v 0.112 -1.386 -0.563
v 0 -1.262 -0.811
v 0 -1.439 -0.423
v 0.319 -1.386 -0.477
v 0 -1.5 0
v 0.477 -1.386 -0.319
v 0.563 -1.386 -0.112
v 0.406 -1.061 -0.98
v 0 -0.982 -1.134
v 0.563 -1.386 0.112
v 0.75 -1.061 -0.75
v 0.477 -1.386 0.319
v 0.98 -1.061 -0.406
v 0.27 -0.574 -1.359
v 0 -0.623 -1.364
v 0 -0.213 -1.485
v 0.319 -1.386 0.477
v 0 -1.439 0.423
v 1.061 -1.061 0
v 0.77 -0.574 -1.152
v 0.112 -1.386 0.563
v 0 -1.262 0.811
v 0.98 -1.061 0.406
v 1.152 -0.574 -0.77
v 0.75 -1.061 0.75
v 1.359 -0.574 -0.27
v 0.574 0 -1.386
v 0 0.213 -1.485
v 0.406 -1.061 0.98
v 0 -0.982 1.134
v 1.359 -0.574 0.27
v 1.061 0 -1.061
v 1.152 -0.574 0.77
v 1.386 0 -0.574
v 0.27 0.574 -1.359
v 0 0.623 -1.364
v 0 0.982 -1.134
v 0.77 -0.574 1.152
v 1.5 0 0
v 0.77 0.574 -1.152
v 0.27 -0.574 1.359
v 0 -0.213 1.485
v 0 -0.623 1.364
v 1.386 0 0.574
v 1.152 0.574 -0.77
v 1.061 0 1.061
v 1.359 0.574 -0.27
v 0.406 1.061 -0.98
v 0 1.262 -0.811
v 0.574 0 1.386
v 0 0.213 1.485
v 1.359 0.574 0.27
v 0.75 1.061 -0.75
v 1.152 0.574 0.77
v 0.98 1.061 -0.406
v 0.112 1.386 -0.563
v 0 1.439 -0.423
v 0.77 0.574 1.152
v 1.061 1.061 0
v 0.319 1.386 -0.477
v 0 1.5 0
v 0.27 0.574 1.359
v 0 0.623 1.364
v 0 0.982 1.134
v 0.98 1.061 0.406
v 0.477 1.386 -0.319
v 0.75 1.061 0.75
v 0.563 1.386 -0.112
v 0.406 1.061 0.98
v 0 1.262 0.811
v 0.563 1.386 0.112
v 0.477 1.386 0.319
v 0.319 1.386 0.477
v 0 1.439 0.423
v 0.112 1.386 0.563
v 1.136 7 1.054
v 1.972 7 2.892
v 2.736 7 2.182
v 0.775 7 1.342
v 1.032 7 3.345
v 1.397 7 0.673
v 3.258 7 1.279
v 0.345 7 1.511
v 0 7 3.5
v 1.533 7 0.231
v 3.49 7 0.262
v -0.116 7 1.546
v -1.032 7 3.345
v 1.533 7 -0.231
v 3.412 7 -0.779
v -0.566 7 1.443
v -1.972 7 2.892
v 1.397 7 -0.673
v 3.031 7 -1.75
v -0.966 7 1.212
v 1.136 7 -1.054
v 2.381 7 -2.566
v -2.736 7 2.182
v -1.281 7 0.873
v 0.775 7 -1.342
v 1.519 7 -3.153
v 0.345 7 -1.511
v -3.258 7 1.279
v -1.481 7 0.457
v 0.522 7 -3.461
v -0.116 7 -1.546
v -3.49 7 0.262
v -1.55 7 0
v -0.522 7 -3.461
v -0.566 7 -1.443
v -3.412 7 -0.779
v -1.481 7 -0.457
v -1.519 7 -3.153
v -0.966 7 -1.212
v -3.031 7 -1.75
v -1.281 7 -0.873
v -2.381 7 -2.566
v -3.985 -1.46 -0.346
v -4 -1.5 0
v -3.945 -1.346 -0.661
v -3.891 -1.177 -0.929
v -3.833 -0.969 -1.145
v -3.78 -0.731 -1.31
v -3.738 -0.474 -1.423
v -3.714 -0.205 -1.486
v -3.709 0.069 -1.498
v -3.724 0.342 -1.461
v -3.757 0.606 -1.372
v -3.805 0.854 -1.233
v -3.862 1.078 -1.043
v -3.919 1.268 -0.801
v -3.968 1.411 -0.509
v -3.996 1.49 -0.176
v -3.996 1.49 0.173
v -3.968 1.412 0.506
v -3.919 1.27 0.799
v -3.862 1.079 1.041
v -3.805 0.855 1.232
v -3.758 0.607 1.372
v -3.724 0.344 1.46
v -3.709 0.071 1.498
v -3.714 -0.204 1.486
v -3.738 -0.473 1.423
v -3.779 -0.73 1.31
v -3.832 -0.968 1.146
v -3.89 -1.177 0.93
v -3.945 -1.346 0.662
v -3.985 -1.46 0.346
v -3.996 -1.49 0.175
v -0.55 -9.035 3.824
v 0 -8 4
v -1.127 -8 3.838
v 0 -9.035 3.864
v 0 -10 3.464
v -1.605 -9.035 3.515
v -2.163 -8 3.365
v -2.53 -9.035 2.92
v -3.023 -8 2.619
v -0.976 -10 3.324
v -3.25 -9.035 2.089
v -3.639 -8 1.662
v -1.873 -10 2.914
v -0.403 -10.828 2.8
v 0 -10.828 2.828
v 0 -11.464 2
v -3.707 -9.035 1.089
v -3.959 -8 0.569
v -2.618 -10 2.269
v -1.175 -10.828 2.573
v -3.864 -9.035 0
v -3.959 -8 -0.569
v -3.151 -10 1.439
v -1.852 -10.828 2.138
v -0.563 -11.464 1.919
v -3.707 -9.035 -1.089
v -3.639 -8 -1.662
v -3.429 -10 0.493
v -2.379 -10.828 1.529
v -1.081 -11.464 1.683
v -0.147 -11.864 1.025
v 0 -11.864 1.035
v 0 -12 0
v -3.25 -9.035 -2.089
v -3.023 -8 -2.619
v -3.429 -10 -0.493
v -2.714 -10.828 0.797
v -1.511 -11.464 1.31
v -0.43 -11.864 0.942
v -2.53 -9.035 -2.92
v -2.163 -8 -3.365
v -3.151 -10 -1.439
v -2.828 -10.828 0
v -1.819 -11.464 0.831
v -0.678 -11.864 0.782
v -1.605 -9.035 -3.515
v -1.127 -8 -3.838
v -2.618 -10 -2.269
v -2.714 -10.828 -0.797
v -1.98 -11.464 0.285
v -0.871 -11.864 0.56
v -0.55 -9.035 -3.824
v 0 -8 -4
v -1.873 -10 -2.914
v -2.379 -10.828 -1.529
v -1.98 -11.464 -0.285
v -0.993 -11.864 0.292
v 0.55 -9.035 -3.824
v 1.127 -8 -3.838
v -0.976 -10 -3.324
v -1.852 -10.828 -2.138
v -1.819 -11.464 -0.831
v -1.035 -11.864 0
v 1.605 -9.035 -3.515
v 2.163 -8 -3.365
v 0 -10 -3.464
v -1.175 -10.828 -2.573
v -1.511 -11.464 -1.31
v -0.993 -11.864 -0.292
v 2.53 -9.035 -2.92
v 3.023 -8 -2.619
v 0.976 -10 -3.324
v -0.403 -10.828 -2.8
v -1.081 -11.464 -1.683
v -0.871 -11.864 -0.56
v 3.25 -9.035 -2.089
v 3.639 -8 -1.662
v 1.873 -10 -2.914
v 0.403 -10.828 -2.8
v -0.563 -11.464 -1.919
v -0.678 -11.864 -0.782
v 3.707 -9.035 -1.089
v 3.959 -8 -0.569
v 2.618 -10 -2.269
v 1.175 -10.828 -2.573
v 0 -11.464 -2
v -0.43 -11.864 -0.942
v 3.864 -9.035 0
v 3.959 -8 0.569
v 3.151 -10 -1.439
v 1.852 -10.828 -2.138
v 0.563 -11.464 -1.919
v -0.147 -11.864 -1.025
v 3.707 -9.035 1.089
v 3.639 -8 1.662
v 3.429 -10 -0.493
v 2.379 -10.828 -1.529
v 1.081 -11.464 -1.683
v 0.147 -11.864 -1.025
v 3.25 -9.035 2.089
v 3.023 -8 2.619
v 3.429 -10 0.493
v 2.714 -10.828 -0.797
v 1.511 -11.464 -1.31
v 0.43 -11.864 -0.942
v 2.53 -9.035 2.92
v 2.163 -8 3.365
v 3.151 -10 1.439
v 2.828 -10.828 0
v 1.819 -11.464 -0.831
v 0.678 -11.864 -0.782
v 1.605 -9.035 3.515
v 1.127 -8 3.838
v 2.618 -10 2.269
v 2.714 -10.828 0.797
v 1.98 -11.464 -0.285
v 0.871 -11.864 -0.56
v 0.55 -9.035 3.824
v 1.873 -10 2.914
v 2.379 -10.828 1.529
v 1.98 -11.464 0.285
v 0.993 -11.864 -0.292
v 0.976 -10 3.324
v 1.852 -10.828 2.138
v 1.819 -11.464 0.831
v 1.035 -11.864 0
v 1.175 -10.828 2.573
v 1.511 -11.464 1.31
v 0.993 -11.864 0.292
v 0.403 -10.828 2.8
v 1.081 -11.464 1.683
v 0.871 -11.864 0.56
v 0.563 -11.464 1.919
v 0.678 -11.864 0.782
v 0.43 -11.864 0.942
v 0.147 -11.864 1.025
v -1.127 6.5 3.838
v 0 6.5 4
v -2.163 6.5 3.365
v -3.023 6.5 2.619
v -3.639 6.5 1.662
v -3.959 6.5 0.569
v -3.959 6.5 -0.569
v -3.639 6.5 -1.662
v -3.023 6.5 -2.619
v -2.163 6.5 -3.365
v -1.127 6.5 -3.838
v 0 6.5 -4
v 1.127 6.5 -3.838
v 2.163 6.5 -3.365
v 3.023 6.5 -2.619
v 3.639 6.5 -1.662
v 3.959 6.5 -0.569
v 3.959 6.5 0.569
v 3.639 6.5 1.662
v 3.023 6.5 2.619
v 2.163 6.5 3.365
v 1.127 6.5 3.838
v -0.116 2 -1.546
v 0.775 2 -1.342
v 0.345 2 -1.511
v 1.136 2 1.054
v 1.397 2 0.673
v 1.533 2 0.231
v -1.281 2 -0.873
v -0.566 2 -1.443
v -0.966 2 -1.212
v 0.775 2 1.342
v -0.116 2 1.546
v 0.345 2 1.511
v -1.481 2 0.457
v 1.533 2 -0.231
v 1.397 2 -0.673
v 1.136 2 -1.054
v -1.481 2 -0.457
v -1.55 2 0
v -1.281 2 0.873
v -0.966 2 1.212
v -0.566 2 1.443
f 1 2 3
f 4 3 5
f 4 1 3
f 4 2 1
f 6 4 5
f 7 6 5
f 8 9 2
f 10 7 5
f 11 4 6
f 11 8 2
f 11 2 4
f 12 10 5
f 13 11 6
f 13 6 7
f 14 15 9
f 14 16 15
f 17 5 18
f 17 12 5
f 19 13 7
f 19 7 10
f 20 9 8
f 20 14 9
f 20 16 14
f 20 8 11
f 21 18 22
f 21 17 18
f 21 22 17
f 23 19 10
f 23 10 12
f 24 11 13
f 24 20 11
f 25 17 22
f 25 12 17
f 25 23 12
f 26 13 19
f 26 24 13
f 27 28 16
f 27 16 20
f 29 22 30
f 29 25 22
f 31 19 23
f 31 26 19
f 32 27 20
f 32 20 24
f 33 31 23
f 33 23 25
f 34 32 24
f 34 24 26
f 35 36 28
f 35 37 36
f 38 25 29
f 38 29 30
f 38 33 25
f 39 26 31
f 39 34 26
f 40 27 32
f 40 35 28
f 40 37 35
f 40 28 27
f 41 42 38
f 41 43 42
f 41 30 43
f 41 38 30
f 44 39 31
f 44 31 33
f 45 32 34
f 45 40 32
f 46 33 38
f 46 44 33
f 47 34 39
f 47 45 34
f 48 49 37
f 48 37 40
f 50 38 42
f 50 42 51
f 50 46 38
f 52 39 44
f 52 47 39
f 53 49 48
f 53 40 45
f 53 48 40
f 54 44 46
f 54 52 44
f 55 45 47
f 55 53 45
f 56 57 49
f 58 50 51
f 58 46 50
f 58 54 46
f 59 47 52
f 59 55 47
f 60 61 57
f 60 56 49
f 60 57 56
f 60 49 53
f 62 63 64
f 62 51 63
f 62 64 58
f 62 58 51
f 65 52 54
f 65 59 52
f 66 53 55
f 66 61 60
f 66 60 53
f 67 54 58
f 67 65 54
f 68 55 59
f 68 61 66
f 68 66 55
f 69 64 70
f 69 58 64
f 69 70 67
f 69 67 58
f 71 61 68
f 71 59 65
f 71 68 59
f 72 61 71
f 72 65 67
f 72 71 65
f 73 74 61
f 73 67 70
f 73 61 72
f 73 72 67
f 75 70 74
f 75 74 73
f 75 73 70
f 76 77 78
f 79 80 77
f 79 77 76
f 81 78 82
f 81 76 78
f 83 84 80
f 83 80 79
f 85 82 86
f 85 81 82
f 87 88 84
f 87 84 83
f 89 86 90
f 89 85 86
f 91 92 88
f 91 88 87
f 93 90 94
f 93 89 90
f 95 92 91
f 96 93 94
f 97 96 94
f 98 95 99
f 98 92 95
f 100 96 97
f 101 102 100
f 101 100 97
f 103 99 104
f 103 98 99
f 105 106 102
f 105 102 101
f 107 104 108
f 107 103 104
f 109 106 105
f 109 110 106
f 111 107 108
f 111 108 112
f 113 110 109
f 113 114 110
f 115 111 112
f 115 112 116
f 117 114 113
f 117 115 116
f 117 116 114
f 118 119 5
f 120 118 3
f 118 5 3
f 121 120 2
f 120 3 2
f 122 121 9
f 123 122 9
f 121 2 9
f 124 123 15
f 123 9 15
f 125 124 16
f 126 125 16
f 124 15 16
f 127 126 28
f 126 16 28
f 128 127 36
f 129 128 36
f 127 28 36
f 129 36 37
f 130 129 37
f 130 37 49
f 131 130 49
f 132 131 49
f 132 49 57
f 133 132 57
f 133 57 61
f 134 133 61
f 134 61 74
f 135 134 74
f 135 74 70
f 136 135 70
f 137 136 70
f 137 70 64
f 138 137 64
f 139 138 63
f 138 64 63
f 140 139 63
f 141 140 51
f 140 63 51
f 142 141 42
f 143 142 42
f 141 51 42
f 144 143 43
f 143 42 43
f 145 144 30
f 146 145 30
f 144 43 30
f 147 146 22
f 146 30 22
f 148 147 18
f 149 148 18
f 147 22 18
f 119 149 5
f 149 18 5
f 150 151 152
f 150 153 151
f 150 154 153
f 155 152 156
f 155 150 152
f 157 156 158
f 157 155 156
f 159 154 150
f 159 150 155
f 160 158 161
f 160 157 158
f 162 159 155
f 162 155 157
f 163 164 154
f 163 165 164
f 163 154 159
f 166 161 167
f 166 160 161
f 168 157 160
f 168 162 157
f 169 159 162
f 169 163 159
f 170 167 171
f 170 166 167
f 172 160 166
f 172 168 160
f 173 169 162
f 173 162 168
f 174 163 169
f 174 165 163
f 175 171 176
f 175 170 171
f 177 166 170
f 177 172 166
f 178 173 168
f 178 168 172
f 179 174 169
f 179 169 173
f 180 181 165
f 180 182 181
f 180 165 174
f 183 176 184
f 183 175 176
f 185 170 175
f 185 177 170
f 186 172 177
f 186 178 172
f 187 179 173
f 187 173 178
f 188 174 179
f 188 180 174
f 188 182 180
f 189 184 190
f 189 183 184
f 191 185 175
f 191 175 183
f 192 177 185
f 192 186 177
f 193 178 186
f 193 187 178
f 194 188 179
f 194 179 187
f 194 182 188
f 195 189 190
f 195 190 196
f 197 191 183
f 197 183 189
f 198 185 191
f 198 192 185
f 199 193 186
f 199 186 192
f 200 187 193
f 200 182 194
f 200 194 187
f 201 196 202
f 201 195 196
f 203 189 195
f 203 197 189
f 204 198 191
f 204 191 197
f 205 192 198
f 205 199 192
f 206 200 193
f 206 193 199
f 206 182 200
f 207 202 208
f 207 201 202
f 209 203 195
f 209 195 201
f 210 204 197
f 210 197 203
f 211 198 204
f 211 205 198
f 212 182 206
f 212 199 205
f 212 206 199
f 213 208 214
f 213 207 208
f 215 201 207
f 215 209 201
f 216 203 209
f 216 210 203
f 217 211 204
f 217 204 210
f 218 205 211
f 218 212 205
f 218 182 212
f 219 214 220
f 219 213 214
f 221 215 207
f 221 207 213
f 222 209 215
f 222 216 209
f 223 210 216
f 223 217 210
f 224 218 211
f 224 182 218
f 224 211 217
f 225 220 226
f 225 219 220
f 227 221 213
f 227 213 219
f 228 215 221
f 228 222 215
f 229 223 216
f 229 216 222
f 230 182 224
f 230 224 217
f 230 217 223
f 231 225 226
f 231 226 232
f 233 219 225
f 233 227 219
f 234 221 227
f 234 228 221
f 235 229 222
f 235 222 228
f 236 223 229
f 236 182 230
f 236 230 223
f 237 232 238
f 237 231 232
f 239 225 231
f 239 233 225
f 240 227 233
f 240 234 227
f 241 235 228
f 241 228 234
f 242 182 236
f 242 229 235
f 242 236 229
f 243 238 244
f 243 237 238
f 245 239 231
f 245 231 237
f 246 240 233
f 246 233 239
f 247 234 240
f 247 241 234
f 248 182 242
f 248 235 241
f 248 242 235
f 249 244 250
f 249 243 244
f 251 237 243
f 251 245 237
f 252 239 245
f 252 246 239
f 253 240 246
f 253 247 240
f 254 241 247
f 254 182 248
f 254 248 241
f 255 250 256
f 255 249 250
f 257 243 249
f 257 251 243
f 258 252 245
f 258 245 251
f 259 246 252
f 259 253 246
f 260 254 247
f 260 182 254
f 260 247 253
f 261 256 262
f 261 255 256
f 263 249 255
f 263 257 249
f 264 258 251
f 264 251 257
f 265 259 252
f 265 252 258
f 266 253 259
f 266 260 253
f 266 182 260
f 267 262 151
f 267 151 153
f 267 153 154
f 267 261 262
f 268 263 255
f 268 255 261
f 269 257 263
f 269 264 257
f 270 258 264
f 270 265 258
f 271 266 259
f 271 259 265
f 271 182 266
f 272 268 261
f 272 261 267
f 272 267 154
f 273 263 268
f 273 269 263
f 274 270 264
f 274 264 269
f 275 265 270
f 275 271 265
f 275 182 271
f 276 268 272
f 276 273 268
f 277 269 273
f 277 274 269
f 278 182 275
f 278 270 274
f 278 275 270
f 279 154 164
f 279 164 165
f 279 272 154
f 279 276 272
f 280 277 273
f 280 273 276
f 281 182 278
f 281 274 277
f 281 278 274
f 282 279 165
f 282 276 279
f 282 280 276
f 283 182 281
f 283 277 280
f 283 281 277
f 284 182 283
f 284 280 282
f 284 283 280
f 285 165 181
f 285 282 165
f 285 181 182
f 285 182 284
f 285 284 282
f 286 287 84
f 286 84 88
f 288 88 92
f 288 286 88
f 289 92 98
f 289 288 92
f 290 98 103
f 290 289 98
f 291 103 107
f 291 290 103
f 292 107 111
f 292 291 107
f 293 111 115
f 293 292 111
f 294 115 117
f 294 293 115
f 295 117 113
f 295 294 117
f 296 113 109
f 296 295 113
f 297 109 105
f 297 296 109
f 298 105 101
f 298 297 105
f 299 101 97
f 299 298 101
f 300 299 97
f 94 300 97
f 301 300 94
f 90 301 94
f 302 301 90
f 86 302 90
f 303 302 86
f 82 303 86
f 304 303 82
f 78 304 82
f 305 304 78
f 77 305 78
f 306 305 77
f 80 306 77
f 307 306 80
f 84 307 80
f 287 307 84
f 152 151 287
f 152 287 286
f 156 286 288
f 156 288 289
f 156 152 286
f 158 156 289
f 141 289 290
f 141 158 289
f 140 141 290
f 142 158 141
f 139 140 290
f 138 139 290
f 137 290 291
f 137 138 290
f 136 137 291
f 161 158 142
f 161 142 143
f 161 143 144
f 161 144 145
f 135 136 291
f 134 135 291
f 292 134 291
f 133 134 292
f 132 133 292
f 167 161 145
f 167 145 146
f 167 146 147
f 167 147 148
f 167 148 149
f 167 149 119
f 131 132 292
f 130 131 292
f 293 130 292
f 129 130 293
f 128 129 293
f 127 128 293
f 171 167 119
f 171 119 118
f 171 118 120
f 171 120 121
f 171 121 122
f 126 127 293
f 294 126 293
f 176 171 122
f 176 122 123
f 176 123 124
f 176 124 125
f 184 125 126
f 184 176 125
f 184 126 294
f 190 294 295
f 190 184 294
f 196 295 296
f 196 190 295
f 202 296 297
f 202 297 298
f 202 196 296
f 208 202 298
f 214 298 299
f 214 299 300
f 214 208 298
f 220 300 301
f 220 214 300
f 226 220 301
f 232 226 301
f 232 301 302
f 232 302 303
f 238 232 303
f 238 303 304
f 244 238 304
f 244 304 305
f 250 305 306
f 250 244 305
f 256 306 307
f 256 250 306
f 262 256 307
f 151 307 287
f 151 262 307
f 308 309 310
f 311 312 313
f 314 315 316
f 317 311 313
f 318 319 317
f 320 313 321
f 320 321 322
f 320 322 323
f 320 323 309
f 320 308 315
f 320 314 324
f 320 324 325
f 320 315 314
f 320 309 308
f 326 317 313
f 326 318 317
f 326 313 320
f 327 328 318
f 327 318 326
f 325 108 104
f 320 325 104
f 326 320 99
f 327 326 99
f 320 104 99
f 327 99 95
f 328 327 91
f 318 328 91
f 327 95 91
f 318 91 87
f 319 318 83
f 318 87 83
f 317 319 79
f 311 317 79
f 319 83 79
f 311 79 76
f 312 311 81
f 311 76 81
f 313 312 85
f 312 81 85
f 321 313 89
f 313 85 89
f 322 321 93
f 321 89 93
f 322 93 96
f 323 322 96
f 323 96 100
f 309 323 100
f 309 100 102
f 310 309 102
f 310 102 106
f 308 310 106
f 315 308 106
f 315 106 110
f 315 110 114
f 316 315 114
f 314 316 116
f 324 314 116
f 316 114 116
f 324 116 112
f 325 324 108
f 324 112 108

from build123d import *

# Parameters (mm, degrees)
F2_DEPTH = 25
F3_SIZE  = 0.5
F4_R     = 1.55
F5_DEPTH = 5


with BuildPart() as f1:
    # F0 (on Right) → F1 (revolve)
    with BuildSketch(Plane.YZ):
        with BuildLine():
            Line((1.5, 0), (7, 0))
            Line((7, 0), (7, 4))
            Line((7, 4), (-8, 4))
            ThreePointArc((-8, 4), (-10.8284271247, 2.8284271247), (-12, 0))
            Line((-12, 0), (-1.5, 0))
            ThreePointArc((-1.5, 0), (0, 1.5), (1.5, 0))
        make_face()
        with BuildLine():
            ThreePointArc((-1.5, 0), (0, -1.5), (1.5, 0))
            Line((1.5, 0), (-1.5, 0))
        make_face()
        with BuildLine():
            Line((-1.5, 0), (1.5, 0))
            ThreePointArc((1.5, 0), (0, 1.5), (-1.5, 0))
        make_face()
    revolve(axis=Axis((0, -2.5, 0), (0, -1, 0)))

    # F0 (on Right) → F2 (cut)
    with BuildSketch(Plane.YZ):
        with BuildLine():
            Line((-1.5, 0), (1.5, 0))
            ThreePointArc((1.5, 0), (0, 1.5), (-1.5, 0))
        make_face()
        with BuildLine():
            ThreePointArc((-1.5, 0), (0, -1.5), (1.5, 0))
            Line((1.5, 0), (-1.5, 0))
        make_face()
    extrude(amount=-F2_DEPTH, mode=Mode.SUBTRACT)

    # F3
    f3_edges = [f1.edges().sort_by_distance(p)[0] for p in [
        (0, 7, -4),
    ]]
    chamfer(f3_edges, length=F3_SIZE)

    # F4 (on face) → F5 (cut)
    with BuildSketch(Plane(origin=(0, 7, 0), x_dir=(-1, 0, 0), z_dir=(0, 1, 0))):
        Circle(F4_R)
    extrude(amount=-F5_DEPTH, mode=Mode.SUBTRACT)


solid = f1.part
